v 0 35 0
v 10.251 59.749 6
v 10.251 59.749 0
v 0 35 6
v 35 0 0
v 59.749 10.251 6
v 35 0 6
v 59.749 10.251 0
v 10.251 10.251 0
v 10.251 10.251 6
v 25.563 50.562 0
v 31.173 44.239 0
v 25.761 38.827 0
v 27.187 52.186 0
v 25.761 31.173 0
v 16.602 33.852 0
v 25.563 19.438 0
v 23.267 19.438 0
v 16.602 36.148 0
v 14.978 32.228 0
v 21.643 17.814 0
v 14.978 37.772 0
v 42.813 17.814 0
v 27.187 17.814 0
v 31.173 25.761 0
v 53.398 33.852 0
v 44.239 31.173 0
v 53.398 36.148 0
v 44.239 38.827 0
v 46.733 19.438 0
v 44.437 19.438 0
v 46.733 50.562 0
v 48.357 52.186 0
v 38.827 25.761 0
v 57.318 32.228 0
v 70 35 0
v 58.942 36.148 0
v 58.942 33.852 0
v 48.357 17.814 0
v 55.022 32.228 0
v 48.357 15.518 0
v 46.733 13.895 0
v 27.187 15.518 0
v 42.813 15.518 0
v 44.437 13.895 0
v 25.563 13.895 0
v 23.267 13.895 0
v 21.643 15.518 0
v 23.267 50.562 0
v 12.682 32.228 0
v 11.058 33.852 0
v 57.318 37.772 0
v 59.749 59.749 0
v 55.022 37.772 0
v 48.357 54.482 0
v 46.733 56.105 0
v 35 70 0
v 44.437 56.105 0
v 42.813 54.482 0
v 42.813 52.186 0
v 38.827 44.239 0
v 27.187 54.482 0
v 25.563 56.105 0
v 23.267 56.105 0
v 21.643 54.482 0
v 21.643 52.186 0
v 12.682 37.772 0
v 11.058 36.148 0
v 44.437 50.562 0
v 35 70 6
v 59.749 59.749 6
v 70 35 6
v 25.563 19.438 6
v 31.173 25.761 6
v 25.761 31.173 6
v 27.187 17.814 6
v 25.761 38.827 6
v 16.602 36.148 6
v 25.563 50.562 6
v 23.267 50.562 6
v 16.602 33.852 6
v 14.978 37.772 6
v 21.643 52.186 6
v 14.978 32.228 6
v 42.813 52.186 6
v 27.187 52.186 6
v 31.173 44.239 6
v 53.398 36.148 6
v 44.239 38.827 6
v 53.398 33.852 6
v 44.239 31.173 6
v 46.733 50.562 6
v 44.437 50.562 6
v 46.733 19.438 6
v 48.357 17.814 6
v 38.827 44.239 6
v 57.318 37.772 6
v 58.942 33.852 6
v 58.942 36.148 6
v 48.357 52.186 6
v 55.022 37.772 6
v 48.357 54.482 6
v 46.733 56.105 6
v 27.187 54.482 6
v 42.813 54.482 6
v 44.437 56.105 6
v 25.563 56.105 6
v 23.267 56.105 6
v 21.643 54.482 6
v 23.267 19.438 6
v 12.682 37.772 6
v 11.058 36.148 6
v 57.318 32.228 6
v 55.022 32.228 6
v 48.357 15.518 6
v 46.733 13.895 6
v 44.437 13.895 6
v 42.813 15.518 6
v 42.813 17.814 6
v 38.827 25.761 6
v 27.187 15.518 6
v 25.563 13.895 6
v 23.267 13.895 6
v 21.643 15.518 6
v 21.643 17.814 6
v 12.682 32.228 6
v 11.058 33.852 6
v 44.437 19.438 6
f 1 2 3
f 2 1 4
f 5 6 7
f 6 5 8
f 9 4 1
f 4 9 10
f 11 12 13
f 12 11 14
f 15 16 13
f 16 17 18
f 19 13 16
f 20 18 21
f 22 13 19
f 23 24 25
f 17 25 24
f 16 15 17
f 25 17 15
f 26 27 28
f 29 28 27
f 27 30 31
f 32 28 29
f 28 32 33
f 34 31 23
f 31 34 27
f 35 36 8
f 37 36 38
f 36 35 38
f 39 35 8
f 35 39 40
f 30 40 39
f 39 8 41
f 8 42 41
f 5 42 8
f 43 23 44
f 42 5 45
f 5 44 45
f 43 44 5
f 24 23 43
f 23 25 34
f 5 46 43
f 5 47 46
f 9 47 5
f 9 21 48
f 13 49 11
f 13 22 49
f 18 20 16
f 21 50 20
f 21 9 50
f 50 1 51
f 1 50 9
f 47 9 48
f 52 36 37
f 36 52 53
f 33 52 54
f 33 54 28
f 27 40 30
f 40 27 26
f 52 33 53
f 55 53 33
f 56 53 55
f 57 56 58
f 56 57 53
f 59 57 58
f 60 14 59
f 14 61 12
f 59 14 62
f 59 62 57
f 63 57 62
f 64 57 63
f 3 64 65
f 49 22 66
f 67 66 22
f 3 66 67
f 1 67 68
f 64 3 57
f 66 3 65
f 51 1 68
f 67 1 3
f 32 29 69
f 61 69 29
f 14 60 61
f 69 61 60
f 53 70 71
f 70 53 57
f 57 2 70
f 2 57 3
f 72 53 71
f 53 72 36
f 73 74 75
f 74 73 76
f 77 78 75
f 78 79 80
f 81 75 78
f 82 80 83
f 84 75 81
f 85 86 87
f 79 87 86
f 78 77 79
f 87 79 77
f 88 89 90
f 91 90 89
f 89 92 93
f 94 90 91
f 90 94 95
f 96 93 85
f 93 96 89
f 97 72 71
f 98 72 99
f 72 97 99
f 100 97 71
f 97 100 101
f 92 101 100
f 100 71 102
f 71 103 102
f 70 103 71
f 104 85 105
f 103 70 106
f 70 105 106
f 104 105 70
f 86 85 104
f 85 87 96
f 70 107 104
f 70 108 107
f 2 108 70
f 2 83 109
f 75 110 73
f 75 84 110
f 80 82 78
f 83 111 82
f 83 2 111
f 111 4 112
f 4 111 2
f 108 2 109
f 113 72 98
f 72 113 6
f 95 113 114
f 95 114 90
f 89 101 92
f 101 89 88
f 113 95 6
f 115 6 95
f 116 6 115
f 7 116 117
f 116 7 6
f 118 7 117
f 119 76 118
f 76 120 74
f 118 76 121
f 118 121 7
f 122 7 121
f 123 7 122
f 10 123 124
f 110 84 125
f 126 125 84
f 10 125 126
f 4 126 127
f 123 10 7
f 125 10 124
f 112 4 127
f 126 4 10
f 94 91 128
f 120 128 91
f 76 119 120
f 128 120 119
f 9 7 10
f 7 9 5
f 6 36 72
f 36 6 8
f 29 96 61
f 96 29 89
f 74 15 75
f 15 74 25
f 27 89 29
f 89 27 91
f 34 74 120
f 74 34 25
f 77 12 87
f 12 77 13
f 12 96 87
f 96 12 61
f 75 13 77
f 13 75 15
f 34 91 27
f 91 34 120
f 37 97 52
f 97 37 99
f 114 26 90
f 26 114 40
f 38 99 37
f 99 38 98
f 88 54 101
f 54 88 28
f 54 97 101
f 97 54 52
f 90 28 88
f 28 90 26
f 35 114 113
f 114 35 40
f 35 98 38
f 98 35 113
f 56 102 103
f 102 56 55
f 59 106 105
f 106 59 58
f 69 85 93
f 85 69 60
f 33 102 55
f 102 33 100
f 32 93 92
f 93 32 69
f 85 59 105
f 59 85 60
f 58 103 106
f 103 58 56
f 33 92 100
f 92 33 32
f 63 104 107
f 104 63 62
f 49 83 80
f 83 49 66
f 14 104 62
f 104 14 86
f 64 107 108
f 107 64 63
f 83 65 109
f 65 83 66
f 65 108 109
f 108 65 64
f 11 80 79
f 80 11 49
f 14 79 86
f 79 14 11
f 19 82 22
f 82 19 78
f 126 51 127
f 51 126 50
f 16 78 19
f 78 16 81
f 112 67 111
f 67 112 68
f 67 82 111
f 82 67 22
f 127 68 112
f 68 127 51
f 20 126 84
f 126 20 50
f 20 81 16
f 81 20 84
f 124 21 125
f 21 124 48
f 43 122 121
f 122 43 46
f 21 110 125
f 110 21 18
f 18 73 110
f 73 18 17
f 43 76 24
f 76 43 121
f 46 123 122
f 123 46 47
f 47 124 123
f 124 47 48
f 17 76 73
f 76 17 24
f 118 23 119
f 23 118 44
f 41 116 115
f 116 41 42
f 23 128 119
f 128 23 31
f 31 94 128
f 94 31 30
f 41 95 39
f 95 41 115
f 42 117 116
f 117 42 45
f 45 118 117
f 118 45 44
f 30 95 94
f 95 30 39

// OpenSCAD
$fn = 32;

// ----------------------------------------------------------------------
// Polygon plate: 8-gon R35, 6 bolt windows
// ----------------------------------------------------------------------

// --- parameters (mm) ---
sides = 8;                // number of polygon sides
plate_r = 35;             // circumscribed radius of the polygon
bore_r = 10;              // centre bore radius
bolts = 6;                // number of bolt windows
ring_r = 21.17;           // bolt-circle radius
bolt_r = 3;               // bolt window radius
plate_t = 6;              // plate thickness, Z (extrusion height)

plate_d = 2 * plate_r;  // circumscribed diameter
bore_d = 2 * bore_r;  // centre bore diameter
bolt_d = 2 * bolt_r;  // bolt window diameter
ring_d = 2 * ring_r;  // bolt-circle diameter

profile = [[70, 35], [59.749, 59.749], [35, 70], [10.251, 59.749], [0, 35], [10.251, 10.251], [35, 0], [59.749, 10.251]];  // primary outline, 8 points, counter clockwise
void_1 = [[44.239, 38.827], [38.827, 44.239], [31.173, 44.239], [25.761, 38.827], [25.761, 31.173], [31.173, 25.761], [38.827, 25.761], [44.239, 31.173]];  // centre bore, 8 points
void_2 = [[58.942, 36.148], [57.318, 37.772], [55.022, 37.772], [53.398, 36.148], [53.398, 33.852], [55.022, 32.228], [57.318, 32.228], [58.942, 33.852]];  // bolt window 1, 8 points
void_3 = [[48.357, 54.482], [46.733, 56.105], [44.437, 56.105], [42.813, 54.482], [42.813, 52.186], [44.437, 50.562], [46.733, 50.562], [48.357, 52.186]];  // bolt window 2, 8 points
void_4 = [[27.187, 54.482], [25.563, 56.105], [23.267, 56.105], [21.643, 54.482], [21.643, 52.186], [23.267, 50.562], [25.563, 50.562], [27.187, 52.186]];  // bolt window 3, 8 points
void_5 = [[16.602, 36.148], [14.978, 37.772], [12.682, 37.772], [11.058, 36.148], [11.058, 33.852], [12.682, 32.228], [14.978, 32.228], [16.602, 33.852]];  // bolt window 4, 8 points
void_6 = [[27.187, 17.814], [25.563, 19.438], [23.267, 19.438], [21.643, 17.814], [21.643, 15.518], [23.267, 13.895], [25.563, 13.895], [27.187, 15.518]];  // bolt window 5, 8 points
void_7 = [[48.357, 17.814], [46.733, 19.438], [44.437, 19.438], [42.813, 17.814], [42.813, 15.518], [44.437, 13.895], [46.733, 13.895], [48.357, 15.518]];  // bolt window 6, 8 points

// --- the one profile operation ---
difference() {
  linear_extrude(height = plate_t) polygon(points = profile);
  translate([0, 0, -1])
    linear_extrude(height = plate_t + 2) polygon(points = void_1);
  translate([0, 0, -1])
    linear_extrude(height = plate_t + 2) polygon(points = void_2);
  translate([0, 0, -1])
    linear_extrude(height = plate_t + 2) polygon(points = void_3);
  translate([0, 0, -1])
    linear_extrude(height = plate_t + 2) polygon(points = void_4);
  translate([0, 0, -1])
    linear_extrude(height = plate_t + 2) polygon(points = void_5);
  translate([0, 0, -1])
    linear_extrude(height = plate_t + 2) polygon(points = void_6);
  translate([0, 0, -1])
    linear_extrude(height = plate_t + 2) polygon(points = void_7);
}
